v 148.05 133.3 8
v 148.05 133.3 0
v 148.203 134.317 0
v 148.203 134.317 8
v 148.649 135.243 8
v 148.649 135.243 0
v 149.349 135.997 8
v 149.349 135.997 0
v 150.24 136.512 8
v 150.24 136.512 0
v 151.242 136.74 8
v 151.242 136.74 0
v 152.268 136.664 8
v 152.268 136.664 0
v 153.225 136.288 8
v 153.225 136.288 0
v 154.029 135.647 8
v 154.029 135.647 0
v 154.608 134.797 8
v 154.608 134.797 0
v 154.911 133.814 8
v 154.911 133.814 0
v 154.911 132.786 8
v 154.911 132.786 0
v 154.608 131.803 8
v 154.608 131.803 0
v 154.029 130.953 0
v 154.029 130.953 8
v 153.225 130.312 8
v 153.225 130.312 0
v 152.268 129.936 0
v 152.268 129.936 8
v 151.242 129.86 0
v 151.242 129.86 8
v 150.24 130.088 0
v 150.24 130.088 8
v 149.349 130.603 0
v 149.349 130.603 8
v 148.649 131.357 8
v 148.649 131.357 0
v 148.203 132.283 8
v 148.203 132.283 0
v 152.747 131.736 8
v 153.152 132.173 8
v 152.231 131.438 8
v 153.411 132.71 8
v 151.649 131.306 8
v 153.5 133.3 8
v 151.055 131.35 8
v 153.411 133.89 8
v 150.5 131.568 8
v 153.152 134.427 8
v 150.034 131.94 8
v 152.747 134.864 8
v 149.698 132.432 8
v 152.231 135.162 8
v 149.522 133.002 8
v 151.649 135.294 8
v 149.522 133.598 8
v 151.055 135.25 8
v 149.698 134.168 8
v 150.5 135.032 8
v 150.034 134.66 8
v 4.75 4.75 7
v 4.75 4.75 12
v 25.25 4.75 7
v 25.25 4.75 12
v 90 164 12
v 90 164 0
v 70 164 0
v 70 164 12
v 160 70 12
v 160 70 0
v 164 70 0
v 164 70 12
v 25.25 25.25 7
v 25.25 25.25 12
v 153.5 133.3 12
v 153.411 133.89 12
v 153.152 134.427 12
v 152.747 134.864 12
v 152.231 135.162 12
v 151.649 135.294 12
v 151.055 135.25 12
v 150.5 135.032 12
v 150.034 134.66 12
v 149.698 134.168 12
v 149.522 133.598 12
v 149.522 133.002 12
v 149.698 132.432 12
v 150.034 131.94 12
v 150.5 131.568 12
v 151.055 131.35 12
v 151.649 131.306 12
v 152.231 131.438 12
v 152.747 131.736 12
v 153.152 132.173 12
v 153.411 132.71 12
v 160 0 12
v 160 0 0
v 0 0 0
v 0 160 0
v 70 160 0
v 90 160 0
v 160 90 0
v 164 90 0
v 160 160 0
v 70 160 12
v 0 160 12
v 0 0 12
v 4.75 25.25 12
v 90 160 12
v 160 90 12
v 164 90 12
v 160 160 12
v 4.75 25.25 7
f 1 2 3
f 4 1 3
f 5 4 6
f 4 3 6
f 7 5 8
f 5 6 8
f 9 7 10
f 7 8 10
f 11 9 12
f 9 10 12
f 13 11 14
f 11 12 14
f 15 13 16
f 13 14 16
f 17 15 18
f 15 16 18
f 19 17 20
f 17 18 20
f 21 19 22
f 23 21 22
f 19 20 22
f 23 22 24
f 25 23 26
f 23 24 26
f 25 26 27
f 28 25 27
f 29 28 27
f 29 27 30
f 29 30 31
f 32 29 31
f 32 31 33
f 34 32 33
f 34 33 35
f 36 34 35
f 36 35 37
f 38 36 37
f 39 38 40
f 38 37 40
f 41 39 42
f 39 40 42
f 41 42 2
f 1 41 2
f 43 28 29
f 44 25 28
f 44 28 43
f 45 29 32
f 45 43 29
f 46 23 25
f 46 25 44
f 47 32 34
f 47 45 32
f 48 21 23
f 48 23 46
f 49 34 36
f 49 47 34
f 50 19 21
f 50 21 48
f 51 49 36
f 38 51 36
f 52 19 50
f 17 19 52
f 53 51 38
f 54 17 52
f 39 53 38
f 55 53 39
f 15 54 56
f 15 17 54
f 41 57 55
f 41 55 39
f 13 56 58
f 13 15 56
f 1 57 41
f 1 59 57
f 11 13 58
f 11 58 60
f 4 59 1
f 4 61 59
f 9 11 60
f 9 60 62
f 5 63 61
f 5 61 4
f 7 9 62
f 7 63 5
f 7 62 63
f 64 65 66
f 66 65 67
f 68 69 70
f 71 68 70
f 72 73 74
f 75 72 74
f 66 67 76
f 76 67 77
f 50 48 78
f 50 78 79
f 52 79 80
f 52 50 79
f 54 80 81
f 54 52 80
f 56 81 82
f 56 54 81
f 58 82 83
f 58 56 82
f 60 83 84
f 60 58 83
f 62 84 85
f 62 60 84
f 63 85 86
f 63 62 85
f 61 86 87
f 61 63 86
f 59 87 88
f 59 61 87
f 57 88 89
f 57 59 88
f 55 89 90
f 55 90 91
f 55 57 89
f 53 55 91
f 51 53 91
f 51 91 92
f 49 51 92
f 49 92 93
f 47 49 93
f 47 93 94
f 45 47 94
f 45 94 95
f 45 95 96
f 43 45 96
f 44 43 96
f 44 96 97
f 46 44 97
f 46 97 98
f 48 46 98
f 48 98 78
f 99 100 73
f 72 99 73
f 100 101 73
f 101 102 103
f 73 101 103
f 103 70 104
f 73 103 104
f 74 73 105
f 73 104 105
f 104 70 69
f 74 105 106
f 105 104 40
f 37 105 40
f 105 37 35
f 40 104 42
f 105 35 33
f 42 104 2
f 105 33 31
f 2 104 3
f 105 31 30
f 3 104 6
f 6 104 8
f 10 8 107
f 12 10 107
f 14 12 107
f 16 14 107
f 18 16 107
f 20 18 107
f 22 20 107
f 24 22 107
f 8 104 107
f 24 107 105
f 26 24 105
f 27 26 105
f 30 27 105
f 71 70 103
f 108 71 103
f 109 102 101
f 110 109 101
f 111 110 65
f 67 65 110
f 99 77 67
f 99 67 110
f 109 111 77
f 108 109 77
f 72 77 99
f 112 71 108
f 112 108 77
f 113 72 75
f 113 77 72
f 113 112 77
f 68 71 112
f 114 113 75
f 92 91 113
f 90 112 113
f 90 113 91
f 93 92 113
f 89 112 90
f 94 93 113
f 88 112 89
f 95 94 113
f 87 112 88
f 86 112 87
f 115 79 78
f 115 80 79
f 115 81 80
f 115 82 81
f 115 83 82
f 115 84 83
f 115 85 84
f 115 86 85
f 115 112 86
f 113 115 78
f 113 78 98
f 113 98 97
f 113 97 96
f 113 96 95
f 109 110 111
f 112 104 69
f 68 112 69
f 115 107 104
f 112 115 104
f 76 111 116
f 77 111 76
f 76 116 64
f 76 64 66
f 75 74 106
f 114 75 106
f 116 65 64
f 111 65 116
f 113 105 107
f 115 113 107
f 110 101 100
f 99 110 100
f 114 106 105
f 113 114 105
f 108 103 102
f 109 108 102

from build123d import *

# Parameters (mm, degrees)
SKETCH1_R           = 2
BOSS_EXTRUDE1_DEPTH = 12
SKETCH2_W           = 20.5
SKETCH2_H           = 20.5
CUT_EXTRUDE1_DEPTH  = 5
SKETCH4_R           = 3.45
CUT_EXTRUDE7_DEPTH  = 8


with BuildPart() as part:
    # Sketch1 → Boss-Extrude1 (new body)
    with BuildSketch(Plane.XY):
        Polygon((0, 0), (69.7, 0), (90.3, 0), (160, 0), (160, 70), (164, 70), (164, 90), (160, 90), (160, 160), (90, 160), (90, 164), (70, 164), (70, 160), (0, 160), (0, 90.3), (0, 69.7), align=None)
        with Locations((151.5, 133.3)):
            Circle(SKETCH1_R, mode=Mode.SUBTRACT)
    extrude(amount=BOSS_EXTRUDE1_DEPTH)

    # Sketch2 → Cut-Extrude1 (cut)
    with BuildSketch(Plane.XY.offset(12)):
        with Locations((15, 15)):
            Rectangle(SKETCH2_W, SKETCH2_H)
    extrude(amount=-CUT_EXTRUDE1_DEPTH, mode=Mode.SUBTRACT)

    # Sketch4 → Cut-Extrude7 (cut)
    with BuildSketch(Plane(origin=(0, 0, 0), x_dir=(-1, 0, 0), z_dir=(0, 0, -1))):
        with Locations((-151.5, 133.3)):
            Circle(SKETCH4_R)
    extrude(amount=-CUT_EXTRUDE7_DEPTH, mode=Mode.SUBTRACT)


solid = part.part
